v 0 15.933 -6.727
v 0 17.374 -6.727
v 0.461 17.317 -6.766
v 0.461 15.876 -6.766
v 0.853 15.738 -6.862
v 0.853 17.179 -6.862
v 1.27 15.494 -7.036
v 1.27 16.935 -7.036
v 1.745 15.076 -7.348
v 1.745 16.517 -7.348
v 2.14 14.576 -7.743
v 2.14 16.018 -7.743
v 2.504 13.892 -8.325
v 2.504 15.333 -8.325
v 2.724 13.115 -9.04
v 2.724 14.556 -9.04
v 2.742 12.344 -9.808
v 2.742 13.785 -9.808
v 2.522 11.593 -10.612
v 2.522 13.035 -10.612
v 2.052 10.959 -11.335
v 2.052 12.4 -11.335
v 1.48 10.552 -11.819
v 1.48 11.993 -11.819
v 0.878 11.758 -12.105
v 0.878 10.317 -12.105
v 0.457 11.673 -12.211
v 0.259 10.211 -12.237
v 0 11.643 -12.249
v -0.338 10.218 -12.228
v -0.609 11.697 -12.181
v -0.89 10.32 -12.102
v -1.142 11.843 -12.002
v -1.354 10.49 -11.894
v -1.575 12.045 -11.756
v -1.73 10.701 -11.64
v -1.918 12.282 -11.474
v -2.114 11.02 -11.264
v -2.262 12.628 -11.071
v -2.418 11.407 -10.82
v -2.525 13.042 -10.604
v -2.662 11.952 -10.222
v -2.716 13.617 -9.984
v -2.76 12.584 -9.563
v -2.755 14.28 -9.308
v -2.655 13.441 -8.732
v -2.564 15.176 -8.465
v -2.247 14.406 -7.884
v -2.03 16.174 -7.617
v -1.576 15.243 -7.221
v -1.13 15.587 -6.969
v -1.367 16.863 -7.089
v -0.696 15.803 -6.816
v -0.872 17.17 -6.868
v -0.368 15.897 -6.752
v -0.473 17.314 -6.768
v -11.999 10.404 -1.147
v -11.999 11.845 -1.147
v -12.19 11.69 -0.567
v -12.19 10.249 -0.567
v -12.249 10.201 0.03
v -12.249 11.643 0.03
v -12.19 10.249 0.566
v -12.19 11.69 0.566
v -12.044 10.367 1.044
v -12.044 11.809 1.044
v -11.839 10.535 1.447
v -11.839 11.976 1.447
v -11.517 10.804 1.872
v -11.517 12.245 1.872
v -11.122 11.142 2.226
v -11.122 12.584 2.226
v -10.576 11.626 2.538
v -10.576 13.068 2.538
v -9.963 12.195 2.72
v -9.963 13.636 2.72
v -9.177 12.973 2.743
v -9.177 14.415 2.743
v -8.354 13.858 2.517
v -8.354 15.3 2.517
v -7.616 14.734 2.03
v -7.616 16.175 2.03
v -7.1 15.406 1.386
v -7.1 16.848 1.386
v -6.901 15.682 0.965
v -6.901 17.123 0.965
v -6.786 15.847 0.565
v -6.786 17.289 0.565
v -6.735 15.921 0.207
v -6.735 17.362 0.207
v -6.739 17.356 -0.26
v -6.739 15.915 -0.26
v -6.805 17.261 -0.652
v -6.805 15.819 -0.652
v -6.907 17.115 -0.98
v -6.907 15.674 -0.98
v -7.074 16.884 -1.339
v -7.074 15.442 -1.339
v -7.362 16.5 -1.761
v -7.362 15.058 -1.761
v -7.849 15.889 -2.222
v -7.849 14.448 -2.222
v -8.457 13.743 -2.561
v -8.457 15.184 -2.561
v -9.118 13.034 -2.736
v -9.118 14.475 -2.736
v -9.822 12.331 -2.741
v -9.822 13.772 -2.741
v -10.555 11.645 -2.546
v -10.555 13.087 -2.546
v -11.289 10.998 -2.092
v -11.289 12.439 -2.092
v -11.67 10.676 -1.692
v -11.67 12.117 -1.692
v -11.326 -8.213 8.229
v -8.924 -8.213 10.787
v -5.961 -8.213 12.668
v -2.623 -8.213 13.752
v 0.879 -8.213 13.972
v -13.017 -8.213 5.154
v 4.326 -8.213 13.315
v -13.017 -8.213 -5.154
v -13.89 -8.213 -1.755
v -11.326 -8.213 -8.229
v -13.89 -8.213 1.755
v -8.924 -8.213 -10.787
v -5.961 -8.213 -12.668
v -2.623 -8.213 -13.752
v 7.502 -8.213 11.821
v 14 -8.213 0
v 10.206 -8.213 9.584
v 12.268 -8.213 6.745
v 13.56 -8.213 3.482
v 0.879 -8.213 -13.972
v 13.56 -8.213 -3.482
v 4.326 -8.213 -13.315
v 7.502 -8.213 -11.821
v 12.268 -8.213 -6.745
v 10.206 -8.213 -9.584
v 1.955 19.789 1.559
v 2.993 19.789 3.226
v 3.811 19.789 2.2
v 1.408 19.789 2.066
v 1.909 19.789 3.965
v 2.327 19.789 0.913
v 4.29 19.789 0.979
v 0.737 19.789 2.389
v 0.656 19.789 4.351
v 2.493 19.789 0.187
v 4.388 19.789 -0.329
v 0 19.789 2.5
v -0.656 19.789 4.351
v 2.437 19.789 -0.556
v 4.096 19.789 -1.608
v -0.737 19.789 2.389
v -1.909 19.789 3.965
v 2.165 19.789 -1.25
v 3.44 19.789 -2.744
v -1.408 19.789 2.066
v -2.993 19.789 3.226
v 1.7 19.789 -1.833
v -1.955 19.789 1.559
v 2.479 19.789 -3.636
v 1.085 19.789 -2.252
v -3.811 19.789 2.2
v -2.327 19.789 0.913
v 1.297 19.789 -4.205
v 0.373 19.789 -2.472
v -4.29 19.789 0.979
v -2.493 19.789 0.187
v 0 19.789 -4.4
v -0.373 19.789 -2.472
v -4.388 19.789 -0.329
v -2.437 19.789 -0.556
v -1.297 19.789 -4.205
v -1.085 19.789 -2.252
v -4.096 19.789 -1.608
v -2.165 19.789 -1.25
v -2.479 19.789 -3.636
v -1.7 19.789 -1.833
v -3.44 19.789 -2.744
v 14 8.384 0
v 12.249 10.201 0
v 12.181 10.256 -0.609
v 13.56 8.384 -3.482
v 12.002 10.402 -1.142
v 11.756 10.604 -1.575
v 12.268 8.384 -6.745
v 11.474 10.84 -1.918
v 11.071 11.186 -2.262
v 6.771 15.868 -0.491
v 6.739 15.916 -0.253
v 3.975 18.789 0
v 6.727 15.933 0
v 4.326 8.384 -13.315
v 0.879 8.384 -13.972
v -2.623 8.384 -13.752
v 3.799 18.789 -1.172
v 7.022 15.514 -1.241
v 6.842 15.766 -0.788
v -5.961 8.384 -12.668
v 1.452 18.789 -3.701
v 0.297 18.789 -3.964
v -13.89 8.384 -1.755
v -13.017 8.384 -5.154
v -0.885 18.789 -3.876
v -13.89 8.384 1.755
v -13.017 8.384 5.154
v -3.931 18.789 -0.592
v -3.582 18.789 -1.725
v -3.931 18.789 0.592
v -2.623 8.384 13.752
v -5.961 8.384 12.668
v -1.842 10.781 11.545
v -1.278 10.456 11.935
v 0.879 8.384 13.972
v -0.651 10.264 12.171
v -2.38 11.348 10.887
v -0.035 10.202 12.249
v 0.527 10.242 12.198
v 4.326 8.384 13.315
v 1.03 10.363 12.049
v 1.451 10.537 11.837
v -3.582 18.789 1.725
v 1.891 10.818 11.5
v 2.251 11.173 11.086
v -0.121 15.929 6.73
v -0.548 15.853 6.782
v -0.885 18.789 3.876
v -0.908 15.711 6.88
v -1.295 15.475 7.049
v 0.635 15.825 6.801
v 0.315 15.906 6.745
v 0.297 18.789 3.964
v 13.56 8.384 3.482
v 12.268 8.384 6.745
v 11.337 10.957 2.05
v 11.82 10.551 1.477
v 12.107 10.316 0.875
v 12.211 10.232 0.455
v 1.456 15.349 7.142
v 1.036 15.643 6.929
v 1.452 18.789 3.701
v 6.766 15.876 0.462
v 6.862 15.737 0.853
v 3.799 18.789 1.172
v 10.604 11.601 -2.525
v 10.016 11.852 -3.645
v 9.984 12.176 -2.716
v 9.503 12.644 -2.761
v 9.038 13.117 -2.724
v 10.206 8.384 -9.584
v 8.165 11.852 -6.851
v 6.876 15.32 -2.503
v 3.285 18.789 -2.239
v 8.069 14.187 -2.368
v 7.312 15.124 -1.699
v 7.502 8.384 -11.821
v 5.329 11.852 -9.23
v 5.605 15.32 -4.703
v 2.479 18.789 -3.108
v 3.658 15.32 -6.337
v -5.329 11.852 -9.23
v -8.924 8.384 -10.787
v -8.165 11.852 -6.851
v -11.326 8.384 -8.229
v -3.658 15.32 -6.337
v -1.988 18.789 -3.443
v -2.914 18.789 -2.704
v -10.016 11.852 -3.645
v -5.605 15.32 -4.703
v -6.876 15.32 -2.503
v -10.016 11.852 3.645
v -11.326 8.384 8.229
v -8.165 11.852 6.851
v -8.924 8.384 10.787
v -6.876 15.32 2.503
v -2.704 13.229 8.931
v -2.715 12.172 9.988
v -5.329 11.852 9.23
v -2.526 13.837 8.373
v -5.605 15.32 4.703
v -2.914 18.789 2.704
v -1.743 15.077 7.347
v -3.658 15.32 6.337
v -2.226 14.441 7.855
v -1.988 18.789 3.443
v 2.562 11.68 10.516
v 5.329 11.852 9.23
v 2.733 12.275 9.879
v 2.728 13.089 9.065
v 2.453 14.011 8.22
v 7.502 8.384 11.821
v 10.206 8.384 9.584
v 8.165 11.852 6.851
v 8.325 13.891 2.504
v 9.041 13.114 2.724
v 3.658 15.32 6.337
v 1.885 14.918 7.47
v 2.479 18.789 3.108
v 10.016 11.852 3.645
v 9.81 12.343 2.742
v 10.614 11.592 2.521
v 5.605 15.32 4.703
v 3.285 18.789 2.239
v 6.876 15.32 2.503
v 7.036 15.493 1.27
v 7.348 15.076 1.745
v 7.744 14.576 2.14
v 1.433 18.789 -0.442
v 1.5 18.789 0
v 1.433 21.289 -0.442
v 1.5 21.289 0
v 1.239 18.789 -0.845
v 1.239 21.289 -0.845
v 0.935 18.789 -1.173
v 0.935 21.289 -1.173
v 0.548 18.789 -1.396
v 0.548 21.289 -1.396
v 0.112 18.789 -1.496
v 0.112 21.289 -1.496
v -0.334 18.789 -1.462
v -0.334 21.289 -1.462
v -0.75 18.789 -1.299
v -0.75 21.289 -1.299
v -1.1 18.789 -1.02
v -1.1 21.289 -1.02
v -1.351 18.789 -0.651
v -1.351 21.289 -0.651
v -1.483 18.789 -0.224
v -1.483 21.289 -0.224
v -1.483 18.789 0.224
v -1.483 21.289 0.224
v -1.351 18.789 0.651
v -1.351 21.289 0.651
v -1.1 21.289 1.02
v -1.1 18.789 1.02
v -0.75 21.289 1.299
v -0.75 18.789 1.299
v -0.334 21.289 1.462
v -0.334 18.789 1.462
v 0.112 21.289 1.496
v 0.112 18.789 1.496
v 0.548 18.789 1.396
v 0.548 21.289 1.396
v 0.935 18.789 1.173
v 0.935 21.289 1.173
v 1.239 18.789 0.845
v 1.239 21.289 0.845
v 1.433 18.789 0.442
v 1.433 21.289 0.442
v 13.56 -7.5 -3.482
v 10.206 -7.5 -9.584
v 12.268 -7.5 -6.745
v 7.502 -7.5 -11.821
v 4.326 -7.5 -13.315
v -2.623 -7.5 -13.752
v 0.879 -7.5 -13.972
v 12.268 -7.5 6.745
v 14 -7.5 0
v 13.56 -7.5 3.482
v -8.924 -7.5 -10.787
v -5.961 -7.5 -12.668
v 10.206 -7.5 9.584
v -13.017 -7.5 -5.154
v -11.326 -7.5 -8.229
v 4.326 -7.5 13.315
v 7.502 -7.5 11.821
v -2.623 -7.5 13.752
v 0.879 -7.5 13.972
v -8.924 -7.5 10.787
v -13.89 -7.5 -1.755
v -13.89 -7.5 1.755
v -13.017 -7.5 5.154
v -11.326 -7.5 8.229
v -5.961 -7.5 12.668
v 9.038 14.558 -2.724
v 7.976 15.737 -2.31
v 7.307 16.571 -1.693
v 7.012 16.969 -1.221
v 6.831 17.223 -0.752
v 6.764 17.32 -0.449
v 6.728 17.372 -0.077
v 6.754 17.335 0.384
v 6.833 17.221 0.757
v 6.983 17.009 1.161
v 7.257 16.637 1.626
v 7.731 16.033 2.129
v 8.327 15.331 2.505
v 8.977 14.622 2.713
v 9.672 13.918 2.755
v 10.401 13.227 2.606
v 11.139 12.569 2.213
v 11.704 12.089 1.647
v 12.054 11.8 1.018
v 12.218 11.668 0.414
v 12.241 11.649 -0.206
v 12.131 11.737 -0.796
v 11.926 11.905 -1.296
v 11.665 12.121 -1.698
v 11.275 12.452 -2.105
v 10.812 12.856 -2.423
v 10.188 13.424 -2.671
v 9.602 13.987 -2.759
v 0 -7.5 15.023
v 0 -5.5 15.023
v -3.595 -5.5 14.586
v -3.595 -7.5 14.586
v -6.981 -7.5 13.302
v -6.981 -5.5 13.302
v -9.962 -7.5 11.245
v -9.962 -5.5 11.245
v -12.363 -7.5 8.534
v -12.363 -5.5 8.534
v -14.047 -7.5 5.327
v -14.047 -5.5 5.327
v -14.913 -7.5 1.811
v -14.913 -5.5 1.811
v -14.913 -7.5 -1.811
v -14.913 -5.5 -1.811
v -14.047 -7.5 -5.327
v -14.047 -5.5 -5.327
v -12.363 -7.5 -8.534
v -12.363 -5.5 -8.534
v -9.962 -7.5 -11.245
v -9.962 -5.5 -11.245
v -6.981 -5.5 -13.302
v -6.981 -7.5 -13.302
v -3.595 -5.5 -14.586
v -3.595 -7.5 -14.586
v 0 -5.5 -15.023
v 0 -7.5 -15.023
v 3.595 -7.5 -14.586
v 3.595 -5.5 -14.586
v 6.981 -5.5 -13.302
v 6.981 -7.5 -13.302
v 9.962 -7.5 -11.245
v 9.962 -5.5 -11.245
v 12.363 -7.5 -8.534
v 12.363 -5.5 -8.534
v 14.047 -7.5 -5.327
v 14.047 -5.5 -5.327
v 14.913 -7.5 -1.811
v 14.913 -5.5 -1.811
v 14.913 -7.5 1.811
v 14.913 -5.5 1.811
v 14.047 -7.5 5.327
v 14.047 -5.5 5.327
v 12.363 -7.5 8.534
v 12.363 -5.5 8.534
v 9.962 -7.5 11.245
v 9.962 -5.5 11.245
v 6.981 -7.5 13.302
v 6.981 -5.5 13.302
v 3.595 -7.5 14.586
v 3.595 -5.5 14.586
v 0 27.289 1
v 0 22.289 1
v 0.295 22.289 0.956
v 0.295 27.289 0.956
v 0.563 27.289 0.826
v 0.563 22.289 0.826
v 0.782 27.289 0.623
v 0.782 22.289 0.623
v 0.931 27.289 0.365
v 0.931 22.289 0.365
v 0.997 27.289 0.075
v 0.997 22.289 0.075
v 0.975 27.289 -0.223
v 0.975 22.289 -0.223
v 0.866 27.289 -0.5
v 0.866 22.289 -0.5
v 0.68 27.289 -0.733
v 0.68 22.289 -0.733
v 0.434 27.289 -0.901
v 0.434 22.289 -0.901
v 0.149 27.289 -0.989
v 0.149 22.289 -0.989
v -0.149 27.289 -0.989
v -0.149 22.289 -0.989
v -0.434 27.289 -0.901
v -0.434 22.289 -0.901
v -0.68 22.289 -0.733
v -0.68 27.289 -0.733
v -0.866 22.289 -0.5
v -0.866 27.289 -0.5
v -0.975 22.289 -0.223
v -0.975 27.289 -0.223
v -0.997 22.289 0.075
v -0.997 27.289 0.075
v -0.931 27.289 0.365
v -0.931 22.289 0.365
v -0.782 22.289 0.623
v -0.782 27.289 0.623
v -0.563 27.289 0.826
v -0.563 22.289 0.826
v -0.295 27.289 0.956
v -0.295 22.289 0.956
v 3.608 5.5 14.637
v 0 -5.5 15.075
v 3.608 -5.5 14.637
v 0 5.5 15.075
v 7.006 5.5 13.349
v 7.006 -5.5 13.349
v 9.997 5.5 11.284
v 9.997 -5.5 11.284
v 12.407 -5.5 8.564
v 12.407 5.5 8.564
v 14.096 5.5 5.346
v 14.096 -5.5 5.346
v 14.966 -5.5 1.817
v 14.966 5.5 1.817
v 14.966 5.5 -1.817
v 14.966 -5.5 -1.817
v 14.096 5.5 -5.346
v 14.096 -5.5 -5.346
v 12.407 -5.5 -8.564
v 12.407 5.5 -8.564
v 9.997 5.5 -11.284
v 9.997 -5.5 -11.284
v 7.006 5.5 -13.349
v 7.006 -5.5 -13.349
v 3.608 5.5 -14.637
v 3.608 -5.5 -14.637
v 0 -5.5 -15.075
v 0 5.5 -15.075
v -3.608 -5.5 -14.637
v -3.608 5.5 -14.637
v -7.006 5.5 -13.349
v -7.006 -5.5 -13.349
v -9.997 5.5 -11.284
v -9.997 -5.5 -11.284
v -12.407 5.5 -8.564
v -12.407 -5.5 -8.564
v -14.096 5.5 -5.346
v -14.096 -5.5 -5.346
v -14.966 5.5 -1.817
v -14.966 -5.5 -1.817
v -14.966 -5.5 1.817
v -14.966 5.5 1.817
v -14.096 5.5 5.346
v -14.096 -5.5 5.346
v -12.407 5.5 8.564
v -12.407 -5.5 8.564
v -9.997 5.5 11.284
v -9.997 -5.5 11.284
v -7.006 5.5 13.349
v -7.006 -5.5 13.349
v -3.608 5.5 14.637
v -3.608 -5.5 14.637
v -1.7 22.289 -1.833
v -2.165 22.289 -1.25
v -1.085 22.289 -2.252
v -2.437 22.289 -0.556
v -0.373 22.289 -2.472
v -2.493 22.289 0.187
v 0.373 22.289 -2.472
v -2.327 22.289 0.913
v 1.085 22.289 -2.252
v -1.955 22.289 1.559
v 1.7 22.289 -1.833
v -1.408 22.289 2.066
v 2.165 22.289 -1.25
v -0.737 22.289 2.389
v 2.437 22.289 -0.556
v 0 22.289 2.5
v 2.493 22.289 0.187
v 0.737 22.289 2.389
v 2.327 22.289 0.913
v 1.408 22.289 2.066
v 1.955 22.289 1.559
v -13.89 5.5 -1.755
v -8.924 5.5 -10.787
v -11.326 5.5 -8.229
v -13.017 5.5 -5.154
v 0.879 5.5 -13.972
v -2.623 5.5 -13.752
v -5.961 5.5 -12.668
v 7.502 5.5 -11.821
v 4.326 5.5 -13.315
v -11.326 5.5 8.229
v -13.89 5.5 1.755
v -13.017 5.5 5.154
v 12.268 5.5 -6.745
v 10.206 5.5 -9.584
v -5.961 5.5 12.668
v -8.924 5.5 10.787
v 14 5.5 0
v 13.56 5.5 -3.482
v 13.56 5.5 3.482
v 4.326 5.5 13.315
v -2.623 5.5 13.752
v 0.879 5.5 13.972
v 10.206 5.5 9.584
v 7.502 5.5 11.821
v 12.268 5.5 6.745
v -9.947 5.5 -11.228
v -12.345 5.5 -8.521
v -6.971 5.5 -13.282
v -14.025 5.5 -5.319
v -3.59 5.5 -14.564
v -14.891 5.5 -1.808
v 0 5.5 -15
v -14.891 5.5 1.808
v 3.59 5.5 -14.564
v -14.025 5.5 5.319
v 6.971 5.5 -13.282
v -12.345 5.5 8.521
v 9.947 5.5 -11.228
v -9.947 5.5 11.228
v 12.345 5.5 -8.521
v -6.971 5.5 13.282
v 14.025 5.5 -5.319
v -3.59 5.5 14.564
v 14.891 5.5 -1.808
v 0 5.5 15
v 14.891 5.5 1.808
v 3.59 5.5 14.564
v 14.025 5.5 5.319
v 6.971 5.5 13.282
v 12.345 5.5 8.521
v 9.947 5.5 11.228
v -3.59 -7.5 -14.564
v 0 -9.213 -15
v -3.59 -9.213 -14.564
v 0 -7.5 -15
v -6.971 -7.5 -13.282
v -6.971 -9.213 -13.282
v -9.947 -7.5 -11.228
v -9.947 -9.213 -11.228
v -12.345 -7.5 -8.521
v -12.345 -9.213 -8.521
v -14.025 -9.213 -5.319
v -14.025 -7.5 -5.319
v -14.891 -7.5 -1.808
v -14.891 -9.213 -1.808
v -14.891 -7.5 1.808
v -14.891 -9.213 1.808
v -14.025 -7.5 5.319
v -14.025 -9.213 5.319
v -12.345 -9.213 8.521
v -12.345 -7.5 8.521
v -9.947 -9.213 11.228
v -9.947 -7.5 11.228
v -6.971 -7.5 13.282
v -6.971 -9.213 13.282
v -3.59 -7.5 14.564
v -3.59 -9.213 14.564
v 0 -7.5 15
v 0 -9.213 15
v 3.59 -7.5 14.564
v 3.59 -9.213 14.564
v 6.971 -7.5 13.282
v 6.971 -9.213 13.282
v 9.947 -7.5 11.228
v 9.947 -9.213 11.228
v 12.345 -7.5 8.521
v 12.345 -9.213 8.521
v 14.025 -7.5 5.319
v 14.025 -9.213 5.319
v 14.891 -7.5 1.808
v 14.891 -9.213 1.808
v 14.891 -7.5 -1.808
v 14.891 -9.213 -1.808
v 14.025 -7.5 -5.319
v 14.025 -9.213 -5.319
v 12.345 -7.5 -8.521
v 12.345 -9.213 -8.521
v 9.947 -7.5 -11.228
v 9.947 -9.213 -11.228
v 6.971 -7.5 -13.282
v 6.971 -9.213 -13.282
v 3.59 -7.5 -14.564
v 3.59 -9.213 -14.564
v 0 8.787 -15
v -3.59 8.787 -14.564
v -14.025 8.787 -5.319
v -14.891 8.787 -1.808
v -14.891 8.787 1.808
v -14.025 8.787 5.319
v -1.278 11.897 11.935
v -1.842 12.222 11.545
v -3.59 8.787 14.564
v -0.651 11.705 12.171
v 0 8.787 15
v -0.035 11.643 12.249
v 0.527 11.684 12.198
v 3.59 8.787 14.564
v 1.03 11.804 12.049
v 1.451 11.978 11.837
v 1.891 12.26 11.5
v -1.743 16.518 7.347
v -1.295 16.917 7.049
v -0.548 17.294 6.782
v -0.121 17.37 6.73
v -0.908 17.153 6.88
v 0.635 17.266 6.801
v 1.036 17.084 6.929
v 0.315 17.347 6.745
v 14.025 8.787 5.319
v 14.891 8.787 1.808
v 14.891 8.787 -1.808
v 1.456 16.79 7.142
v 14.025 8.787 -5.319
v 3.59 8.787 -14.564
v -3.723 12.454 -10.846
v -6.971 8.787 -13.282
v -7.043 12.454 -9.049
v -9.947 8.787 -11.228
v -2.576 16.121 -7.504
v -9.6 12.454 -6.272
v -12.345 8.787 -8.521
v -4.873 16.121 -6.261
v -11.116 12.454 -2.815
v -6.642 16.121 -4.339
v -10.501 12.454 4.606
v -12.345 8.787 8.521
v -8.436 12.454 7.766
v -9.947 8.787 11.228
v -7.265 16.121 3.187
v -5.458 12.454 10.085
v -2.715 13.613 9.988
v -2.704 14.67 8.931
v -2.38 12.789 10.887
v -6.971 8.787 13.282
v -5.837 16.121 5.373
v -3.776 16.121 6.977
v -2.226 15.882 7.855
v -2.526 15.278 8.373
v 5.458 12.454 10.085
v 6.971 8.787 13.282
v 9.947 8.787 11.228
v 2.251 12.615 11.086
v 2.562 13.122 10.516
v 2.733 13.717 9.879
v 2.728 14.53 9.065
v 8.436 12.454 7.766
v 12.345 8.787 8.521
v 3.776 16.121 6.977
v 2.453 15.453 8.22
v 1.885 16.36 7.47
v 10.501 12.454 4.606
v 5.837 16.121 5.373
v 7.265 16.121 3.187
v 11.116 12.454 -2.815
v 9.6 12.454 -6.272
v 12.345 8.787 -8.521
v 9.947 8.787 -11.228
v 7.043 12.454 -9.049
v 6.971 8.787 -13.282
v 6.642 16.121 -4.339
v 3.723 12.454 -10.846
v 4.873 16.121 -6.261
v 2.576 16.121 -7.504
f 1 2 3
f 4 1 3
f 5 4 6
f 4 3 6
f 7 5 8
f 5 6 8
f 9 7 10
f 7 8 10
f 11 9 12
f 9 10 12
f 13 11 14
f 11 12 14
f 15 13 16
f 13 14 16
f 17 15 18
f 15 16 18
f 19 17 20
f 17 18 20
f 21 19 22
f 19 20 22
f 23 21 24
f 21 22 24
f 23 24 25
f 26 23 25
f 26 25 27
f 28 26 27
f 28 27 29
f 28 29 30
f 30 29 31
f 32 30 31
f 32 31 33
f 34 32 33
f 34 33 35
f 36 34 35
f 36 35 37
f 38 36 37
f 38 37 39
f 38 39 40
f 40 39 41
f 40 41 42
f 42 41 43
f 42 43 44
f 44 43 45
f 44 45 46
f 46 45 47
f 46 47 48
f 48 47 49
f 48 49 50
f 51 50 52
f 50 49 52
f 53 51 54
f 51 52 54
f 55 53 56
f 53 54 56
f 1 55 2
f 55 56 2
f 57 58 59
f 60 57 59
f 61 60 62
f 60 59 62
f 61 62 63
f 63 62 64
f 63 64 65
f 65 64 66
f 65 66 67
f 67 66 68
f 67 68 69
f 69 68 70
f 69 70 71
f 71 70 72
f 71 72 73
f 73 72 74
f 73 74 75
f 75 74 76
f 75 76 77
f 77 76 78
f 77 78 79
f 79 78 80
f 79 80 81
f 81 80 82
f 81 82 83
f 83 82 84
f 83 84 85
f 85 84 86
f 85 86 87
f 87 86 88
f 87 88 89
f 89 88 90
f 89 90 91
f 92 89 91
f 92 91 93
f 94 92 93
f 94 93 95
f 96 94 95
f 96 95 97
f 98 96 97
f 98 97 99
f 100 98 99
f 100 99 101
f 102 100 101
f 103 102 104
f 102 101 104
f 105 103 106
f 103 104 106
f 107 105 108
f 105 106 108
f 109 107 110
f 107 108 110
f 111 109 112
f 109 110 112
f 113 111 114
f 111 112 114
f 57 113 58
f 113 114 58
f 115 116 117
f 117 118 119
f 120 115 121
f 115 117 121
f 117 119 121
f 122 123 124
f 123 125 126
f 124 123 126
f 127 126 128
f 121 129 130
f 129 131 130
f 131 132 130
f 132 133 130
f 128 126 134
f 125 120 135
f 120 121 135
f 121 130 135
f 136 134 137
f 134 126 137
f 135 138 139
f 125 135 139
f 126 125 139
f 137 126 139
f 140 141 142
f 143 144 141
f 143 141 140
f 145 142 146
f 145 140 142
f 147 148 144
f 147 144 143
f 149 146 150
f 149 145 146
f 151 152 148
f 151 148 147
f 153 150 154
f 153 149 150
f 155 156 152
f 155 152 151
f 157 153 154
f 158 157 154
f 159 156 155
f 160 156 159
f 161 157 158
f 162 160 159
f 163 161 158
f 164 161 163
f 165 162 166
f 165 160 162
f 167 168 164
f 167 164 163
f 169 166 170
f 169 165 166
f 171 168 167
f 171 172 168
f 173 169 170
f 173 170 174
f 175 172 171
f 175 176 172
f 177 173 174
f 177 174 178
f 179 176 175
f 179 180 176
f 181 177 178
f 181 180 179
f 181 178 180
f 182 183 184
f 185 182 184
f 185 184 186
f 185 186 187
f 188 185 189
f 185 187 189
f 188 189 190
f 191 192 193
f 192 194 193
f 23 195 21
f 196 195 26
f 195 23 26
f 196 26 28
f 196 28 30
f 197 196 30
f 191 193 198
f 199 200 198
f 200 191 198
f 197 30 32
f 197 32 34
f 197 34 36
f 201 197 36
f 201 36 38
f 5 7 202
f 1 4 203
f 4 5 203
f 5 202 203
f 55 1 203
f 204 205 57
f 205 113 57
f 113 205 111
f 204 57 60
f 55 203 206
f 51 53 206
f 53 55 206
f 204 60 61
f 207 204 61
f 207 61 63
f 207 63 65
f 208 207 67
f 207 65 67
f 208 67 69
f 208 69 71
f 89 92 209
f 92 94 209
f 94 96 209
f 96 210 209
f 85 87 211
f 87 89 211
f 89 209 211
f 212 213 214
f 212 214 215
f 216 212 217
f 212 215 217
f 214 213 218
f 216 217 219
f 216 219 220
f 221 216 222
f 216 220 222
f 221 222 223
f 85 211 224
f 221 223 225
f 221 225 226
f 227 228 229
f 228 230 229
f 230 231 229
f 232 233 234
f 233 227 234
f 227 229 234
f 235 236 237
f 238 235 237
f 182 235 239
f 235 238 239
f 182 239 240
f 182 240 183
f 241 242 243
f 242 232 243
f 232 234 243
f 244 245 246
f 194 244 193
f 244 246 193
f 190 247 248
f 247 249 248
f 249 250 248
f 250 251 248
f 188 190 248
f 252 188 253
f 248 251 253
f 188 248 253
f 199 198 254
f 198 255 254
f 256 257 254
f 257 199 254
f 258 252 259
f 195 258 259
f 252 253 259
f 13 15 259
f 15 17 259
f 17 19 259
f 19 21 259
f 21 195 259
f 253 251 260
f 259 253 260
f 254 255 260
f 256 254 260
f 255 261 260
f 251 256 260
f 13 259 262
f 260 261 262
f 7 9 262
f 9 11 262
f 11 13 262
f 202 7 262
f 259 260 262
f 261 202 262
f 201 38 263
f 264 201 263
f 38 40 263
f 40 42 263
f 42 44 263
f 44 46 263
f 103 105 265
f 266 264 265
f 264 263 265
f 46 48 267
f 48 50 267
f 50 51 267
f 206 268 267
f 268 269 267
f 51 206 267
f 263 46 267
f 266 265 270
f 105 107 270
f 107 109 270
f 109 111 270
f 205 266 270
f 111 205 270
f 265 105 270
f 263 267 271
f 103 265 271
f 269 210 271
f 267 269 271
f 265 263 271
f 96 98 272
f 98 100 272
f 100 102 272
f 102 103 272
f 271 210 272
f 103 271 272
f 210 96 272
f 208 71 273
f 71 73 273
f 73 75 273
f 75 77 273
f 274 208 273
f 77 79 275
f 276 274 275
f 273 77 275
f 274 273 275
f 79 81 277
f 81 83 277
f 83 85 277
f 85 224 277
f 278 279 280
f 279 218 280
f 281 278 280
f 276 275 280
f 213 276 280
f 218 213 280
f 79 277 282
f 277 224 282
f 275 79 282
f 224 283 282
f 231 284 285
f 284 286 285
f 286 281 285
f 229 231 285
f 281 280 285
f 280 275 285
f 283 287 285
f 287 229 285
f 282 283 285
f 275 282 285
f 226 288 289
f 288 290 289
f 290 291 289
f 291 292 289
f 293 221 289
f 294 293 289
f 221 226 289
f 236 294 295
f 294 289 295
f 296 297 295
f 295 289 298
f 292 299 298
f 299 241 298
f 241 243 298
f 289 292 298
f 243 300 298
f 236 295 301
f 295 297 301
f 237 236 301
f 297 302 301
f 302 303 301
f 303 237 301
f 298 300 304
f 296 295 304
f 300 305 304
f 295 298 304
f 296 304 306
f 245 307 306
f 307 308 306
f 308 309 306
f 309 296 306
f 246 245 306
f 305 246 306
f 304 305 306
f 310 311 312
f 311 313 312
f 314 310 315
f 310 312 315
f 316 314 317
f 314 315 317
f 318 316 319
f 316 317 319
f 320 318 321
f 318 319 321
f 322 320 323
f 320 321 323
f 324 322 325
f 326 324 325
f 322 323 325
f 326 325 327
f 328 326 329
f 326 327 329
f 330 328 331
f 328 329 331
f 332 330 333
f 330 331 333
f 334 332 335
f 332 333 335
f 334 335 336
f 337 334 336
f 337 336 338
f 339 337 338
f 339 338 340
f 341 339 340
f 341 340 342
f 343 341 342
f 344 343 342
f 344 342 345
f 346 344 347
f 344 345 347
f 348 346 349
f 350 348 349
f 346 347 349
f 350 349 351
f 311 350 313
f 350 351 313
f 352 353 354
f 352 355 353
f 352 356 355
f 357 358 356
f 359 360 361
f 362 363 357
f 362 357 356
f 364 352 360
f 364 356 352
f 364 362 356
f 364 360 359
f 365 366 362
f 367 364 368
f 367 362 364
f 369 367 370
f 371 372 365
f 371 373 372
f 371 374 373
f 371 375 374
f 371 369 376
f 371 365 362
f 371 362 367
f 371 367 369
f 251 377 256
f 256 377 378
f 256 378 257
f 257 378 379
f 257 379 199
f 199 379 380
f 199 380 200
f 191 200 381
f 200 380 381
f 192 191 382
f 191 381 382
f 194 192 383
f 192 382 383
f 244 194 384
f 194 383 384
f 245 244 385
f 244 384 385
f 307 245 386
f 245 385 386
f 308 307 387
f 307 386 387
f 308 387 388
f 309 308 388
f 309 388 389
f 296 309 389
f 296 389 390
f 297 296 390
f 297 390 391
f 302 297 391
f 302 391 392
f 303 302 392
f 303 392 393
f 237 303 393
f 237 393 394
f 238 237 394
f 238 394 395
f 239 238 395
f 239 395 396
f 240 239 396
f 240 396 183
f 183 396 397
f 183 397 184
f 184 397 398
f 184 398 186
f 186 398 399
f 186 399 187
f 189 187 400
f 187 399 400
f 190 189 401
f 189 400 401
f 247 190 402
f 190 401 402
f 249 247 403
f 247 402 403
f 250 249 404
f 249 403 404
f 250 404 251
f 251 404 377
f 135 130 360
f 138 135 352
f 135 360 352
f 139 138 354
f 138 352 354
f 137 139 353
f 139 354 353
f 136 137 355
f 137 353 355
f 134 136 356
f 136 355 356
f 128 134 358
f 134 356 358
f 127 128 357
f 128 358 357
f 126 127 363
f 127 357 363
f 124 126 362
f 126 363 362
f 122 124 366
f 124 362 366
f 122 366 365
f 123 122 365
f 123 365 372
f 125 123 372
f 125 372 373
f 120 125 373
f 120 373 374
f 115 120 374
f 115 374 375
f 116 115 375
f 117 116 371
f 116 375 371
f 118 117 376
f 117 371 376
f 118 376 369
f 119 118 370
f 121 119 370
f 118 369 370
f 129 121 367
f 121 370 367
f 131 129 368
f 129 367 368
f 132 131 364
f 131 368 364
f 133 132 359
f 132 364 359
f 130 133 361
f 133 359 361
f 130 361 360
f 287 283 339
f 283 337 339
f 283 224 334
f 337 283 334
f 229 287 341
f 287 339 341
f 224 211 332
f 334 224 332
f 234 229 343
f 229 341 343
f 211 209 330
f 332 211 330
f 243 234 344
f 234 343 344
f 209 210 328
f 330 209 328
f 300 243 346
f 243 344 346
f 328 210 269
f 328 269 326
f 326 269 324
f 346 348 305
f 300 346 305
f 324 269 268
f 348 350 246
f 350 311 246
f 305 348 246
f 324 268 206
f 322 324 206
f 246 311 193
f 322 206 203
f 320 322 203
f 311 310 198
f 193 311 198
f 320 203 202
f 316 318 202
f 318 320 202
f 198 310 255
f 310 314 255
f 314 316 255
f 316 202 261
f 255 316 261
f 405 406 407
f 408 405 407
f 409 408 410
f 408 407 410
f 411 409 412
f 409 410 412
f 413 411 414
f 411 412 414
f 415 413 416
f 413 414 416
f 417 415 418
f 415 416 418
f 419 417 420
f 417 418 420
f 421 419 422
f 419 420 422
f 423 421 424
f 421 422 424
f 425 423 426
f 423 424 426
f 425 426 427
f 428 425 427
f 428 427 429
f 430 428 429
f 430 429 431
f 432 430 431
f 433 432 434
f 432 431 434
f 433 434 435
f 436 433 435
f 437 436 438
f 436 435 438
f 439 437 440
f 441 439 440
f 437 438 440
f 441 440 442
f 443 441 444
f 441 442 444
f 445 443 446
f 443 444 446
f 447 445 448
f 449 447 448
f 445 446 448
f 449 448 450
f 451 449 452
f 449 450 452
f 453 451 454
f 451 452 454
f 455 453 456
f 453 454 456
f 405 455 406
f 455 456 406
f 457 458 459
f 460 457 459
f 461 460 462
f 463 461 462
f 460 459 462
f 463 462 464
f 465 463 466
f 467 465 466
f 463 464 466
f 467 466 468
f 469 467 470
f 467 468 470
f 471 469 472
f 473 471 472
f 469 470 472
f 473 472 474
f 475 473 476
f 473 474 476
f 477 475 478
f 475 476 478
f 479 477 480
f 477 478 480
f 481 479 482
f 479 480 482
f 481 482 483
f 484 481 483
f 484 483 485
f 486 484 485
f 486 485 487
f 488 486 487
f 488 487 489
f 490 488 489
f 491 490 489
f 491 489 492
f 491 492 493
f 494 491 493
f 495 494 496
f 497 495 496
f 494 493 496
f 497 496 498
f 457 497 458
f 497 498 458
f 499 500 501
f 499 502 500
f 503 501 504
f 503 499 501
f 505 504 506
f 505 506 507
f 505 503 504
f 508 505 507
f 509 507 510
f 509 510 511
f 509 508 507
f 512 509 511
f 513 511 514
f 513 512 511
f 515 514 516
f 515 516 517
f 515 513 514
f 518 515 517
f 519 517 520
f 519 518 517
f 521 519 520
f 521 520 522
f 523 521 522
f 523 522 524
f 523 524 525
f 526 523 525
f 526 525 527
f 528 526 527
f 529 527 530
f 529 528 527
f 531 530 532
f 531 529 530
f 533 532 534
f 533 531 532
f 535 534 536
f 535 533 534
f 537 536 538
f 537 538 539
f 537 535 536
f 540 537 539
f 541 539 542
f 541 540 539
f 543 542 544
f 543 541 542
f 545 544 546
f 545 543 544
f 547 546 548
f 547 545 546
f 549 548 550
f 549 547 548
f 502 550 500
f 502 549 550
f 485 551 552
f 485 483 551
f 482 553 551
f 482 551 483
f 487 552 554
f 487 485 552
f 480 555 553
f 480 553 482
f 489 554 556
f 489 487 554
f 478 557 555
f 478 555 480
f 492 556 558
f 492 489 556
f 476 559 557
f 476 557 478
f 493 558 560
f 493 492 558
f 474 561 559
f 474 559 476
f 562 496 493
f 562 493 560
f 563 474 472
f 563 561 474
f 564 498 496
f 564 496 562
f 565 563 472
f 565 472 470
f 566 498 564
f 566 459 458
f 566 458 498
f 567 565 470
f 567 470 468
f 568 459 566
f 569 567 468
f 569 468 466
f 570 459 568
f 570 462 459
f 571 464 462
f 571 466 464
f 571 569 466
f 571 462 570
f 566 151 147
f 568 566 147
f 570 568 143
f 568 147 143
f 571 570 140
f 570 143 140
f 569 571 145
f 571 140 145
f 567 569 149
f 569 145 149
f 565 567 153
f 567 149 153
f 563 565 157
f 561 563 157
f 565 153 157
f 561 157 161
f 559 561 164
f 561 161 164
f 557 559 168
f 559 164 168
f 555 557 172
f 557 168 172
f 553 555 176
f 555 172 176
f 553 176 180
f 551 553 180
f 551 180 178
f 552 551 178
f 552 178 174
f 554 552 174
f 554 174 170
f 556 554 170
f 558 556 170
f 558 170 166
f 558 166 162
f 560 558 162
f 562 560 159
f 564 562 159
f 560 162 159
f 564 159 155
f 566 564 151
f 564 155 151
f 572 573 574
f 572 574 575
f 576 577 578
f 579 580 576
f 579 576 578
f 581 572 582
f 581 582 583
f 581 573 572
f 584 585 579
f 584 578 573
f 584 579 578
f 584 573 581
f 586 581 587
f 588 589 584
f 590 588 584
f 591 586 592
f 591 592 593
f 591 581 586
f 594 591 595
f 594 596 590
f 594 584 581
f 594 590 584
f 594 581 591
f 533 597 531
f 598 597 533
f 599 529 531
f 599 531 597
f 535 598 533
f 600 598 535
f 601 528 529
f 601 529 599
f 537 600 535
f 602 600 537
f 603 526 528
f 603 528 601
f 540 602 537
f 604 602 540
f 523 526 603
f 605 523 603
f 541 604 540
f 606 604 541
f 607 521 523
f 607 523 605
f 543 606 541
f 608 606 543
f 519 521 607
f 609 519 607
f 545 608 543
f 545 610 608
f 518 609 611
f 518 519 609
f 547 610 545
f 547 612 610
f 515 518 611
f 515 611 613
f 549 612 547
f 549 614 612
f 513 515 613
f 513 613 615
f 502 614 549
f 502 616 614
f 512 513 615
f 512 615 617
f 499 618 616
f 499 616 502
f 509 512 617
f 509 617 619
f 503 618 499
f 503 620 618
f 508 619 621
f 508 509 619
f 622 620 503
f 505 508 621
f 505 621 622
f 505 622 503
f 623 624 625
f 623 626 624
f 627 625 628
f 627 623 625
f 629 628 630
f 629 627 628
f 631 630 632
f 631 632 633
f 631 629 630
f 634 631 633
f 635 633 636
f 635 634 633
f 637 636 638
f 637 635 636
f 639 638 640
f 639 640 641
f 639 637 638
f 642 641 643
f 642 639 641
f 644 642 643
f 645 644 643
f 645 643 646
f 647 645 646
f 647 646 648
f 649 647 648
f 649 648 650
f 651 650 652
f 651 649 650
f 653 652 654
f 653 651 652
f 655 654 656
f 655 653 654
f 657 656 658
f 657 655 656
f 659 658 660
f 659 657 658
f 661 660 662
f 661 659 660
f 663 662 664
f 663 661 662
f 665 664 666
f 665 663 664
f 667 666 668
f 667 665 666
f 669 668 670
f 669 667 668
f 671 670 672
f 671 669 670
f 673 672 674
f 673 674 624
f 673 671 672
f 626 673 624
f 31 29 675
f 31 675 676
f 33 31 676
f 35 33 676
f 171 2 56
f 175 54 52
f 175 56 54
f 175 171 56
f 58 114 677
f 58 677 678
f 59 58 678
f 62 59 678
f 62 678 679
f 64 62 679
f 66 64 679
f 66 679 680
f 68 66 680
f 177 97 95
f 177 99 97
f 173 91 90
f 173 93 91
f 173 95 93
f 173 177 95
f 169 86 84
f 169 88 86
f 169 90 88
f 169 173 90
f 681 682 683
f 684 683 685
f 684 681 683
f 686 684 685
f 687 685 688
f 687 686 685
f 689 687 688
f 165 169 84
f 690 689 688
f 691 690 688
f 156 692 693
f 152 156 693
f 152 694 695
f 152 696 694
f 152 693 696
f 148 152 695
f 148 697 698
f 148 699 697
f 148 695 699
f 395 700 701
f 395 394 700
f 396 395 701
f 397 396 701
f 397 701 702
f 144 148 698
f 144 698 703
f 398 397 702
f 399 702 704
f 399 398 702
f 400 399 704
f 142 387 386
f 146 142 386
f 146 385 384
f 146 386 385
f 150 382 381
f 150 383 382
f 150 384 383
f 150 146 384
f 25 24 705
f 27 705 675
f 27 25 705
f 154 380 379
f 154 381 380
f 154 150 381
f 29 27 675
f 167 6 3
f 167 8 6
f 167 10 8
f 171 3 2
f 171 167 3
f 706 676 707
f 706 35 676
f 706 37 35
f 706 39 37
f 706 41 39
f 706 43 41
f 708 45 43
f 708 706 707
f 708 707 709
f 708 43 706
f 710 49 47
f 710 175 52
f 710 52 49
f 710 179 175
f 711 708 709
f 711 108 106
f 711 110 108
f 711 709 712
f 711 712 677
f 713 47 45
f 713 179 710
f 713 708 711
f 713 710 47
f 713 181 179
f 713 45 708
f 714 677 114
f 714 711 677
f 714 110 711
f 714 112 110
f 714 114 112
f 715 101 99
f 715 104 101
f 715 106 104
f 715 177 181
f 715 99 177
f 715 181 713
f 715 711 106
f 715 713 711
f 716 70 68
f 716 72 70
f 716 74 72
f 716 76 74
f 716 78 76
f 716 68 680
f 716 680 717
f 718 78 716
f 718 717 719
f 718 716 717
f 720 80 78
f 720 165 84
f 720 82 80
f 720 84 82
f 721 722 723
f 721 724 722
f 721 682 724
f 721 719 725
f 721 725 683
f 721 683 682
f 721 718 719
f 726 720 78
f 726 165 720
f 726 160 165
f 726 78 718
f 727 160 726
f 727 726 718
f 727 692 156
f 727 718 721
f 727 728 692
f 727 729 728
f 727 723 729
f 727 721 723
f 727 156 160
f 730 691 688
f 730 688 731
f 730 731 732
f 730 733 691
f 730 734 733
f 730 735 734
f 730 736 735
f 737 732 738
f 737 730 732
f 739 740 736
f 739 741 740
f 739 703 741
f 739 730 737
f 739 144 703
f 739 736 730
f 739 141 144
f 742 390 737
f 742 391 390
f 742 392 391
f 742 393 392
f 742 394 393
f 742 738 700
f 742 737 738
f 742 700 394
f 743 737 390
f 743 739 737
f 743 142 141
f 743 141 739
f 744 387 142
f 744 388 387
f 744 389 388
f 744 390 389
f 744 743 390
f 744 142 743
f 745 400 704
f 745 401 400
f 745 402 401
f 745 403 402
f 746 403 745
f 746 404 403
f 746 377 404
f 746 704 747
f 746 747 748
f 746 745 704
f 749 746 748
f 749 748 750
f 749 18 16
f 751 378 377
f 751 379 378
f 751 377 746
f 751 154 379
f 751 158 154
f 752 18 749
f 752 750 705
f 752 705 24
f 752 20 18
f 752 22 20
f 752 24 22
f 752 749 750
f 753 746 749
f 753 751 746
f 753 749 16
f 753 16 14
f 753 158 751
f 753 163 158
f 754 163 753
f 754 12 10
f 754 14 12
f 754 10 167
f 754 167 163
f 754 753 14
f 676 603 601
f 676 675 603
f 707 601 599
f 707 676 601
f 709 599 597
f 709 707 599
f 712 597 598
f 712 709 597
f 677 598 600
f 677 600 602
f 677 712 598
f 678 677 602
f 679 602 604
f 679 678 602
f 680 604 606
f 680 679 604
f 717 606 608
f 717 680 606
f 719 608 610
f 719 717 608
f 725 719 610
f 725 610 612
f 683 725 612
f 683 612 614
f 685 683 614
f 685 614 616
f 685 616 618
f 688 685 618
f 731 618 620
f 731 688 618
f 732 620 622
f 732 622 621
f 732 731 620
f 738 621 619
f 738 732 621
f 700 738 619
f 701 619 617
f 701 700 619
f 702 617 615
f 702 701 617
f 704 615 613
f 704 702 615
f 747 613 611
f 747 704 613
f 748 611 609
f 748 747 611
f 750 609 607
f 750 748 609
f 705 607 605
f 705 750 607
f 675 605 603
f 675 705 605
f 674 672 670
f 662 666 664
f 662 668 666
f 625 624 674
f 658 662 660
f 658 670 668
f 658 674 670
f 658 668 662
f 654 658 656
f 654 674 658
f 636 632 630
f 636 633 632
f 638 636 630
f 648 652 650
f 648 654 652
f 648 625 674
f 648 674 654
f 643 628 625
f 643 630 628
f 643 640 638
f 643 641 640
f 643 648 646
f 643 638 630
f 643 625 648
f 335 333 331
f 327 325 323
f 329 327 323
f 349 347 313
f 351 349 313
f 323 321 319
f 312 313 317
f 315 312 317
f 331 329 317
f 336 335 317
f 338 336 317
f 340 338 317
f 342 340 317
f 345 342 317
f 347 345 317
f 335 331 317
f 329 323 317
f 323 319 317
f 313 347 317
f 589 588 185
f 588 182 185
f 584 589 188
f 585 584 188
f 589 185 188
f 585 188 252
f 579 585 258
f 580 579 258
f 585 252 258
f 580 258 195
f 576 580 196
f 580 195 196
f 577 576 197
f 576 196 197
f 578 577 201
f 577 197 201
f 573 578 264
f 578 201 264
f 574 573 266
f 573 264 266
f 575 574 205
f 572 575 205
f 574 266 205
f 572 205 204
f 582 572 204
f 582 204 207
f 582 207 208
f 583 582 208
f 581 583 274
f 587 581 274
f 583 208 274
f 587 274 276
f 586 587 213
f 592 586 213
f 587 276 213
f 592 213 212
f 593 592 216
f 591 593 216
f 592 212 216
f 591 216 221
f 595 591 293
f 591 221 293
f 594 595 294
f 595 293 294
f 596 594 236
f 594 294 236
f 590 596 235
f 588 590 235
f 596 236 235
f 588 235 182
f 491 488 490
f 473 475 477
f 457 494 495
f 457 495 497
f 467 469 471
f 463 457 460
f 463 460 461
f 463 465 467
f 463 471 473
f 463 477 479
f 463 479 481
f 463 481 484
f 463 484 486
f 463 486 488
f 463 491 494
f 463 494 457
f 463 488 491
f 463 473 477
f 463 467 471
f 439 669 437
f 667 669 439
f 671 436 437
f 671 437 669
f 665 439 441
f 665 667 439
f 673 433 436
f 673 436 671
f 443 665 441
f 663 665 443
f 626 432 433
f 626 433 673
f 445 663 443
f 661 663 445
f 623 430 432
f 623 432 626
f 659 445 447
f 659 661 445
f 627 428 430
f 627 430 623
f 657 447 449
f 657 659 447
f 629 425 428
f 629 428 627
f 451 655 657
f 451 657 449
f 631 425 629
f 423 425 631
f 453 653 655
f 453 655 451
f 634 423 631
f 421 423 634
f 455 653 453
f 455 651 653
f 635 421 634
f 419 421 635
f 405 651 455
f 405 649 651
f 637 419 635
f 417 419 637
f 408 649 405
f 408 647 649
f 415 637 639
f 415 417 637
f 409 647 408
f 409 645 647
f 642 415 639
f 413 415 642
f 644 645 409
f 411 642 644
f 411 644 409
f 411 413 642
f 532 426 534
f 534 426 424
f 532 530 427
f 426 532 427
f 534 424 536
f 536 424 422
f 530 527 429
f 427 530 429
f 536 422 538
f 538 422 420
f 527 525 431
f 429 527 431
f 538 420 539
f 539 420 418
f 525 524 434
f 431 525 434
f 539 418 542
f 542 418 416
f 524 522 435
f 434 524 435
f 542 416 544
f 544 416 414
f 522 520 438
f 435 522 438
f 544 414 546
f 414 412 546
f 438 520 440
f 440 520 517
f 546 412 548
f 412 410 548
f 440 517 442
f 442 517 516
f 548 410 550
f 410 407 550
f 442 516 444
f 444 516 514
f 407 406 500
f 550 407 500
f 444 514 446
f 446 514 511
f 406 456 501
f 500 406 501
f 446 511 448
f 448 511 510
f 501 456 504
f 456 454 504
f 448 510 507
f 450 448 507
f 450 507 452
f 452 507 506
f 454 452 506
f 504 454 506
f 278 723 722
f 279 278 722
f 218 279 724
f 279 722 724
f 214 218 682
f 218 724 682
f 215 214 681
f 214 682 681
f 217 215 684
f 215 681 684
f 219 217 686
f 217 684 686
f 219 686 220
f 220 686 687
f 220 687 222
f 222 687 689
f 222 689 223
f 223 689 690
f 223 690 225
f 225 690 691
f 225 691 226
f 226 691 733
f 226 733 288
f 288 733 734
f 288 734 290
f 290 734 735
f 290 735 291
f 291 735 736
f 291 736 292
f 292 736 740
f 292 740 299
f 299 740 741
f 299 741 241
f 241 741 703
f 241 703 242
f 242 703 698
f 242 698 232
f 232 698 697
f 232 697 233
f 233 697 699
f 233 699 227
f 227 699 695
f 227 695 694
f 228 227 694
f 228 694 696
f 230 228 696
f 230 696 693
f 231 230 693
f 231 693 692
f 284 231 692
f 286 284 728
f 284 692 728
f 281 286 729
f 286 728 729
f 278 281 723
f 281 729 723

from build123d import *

# Parameters (mm, degrees)
CROQUIS3_R              = 2.5
SALIENTE_EXTRUIR1_DEPTH = 2.5
CROQUIS4_R              = 1
SALIENTE_EXTRUIR2_DEPTH = 5
CROQUIS6_R              = 2.760916645
CORTAR_EXTRUIR1_DEPTH   = 35
SALIENTE_EXTRUIR3_START = -1
CROQUIS7_R              = 14
SALIENTE_EXTRUIR3_DEPTH = 1
CROQUIS8_R              = 15.075481364
SALIENTE_EXTRUIR4_DEPTH = 5.5
CROQUIS9_R              = 15.022760534
SALIENTE_EXTRUIR5_DEPTH = 2


# Read off the part's stored shape, not the designer's step: Vaciado1
with BuildPart() as part:
    # Croquis2 → Revolución1 (revolve)
    with BuildSketch(Plane(origin=(0, 0, 0), x_dir=(0, 0, -1), z_dir=(1, 0, 0))):
        Polygon((0, -9.212888184), (15, -9.212888184), (15, 8.787111816), (4.400455902, 19.788614132), (0, 19.788614132), align=None)
    revolve(axis=Axis((0, -10.664729222, 0), (0, 1, 0)))

    # Croquis3 → Saliente-Extruir1 (add)
    with BuildSketch(Plane(origin=(0, 19.788614132, 0), x_dir=(1, 0, 0), z_dir=(0, 1, 0))):
        with Locations(Location((0, 0, 0), (0, 0, 270))):
            Circle(CROQUIS3_R)
    extrude(amount=SALIENTE_EXTRUIR1_DEPTH)

    # Croquis4 → Saliente-Extruir2 (add)
    with BuildSketch(Plane(origin=(0, 22.288614132, 0), x_dir=(1, 0, 0), z_dir=(0, 1, 0))):
        with Locations(Location((0, 0, 0), (0, 0, 270))):
            Circle(CROQUIS4_R)
    extrude(amount=SALIENTE_EXTRUIR2_DEPTH)

    # Vaciado1 outline → Vaciado1 (revolve, cut)
    with BuildSketch(Plane.XY):
        Polygon((14, -9.212888184), (14, 8.383755945), (3.975300644, 18.788614132), (1.5, 18.788614132), (1.5, 21.288614132), (0, 21.288614132), (0, -9.212888184), align=None)
    revolve(axis=Axis((0, 0, 0), (0, 1, 0)), mode=Mode.SUBTRACT)

    # Croquis6 → Cortar-Extruir1 (cut)
    with BuildSketch(Plane(origin=(0, 19.788614132, 0), x_dir=(1, 0, 0), z_dir=(0, 1, 0))):
        with Locations(Location((0, -9.487911963, 0), (0, 0, 168.367798153))):
            Circle(CROQUIS6_R)
        with Locations(Location((-9.487911963, 0, 0), (0, 0, 155.446542586))):
            Circle(CROQUIS6_R)
        with Locations(Location((0, 9.487911963, 0), (0, 0, 270.000000733))):
            Circle(CROQUIS6_R)
        with Locations(Location((9.487911963, 0, 0), (0, 0, 99.378357768))):
            Circle(CROQUIS6_R)
    extrude(amount=-CORTAR_EXTRUIR1_DEPTH, mode=Mode.SUBTRACT)

    # Croquis7 → Saliente-Extruir3 (add)
    with BuildSketch(Plane.XZ.offset(9.212888184).offset(SALIENTE_EXTRUIR3_START)):
        with Locations(Location((0, 0, 0), (0, 0, 270))):
            Circle(CROQUIS7_R)
    extrude(amount=SALIENTE_EXTRUIR3_DEPTH)

    # Croquis8 → Saliente-Extruir4 (add, symmetric)
    with BuildSketch(Plane(origin=(0, 0, 0), x_dir=(1, 0, 0), z_dir=(0, 1, 0))):
        with Locations(Location((0, 0, 0), (0, 0, 270))):
            Circle(CROQUIS8_R)
    extrude(amount=SALIENTE_EXTRUIR4_DEPTH, both=True)

    # Croquis9 → Saliente-Extruir5 (add)
    with BuildSketch(Plane.XZ.offset(5.5)):
        with Locations(Location((0, 0, 0), (0, 0, 90))):
            Circle(CROQUIS9_R)
    extrude(amount=SALIENTE_EXTRUIR5_DEPTH)


solid = part.part
